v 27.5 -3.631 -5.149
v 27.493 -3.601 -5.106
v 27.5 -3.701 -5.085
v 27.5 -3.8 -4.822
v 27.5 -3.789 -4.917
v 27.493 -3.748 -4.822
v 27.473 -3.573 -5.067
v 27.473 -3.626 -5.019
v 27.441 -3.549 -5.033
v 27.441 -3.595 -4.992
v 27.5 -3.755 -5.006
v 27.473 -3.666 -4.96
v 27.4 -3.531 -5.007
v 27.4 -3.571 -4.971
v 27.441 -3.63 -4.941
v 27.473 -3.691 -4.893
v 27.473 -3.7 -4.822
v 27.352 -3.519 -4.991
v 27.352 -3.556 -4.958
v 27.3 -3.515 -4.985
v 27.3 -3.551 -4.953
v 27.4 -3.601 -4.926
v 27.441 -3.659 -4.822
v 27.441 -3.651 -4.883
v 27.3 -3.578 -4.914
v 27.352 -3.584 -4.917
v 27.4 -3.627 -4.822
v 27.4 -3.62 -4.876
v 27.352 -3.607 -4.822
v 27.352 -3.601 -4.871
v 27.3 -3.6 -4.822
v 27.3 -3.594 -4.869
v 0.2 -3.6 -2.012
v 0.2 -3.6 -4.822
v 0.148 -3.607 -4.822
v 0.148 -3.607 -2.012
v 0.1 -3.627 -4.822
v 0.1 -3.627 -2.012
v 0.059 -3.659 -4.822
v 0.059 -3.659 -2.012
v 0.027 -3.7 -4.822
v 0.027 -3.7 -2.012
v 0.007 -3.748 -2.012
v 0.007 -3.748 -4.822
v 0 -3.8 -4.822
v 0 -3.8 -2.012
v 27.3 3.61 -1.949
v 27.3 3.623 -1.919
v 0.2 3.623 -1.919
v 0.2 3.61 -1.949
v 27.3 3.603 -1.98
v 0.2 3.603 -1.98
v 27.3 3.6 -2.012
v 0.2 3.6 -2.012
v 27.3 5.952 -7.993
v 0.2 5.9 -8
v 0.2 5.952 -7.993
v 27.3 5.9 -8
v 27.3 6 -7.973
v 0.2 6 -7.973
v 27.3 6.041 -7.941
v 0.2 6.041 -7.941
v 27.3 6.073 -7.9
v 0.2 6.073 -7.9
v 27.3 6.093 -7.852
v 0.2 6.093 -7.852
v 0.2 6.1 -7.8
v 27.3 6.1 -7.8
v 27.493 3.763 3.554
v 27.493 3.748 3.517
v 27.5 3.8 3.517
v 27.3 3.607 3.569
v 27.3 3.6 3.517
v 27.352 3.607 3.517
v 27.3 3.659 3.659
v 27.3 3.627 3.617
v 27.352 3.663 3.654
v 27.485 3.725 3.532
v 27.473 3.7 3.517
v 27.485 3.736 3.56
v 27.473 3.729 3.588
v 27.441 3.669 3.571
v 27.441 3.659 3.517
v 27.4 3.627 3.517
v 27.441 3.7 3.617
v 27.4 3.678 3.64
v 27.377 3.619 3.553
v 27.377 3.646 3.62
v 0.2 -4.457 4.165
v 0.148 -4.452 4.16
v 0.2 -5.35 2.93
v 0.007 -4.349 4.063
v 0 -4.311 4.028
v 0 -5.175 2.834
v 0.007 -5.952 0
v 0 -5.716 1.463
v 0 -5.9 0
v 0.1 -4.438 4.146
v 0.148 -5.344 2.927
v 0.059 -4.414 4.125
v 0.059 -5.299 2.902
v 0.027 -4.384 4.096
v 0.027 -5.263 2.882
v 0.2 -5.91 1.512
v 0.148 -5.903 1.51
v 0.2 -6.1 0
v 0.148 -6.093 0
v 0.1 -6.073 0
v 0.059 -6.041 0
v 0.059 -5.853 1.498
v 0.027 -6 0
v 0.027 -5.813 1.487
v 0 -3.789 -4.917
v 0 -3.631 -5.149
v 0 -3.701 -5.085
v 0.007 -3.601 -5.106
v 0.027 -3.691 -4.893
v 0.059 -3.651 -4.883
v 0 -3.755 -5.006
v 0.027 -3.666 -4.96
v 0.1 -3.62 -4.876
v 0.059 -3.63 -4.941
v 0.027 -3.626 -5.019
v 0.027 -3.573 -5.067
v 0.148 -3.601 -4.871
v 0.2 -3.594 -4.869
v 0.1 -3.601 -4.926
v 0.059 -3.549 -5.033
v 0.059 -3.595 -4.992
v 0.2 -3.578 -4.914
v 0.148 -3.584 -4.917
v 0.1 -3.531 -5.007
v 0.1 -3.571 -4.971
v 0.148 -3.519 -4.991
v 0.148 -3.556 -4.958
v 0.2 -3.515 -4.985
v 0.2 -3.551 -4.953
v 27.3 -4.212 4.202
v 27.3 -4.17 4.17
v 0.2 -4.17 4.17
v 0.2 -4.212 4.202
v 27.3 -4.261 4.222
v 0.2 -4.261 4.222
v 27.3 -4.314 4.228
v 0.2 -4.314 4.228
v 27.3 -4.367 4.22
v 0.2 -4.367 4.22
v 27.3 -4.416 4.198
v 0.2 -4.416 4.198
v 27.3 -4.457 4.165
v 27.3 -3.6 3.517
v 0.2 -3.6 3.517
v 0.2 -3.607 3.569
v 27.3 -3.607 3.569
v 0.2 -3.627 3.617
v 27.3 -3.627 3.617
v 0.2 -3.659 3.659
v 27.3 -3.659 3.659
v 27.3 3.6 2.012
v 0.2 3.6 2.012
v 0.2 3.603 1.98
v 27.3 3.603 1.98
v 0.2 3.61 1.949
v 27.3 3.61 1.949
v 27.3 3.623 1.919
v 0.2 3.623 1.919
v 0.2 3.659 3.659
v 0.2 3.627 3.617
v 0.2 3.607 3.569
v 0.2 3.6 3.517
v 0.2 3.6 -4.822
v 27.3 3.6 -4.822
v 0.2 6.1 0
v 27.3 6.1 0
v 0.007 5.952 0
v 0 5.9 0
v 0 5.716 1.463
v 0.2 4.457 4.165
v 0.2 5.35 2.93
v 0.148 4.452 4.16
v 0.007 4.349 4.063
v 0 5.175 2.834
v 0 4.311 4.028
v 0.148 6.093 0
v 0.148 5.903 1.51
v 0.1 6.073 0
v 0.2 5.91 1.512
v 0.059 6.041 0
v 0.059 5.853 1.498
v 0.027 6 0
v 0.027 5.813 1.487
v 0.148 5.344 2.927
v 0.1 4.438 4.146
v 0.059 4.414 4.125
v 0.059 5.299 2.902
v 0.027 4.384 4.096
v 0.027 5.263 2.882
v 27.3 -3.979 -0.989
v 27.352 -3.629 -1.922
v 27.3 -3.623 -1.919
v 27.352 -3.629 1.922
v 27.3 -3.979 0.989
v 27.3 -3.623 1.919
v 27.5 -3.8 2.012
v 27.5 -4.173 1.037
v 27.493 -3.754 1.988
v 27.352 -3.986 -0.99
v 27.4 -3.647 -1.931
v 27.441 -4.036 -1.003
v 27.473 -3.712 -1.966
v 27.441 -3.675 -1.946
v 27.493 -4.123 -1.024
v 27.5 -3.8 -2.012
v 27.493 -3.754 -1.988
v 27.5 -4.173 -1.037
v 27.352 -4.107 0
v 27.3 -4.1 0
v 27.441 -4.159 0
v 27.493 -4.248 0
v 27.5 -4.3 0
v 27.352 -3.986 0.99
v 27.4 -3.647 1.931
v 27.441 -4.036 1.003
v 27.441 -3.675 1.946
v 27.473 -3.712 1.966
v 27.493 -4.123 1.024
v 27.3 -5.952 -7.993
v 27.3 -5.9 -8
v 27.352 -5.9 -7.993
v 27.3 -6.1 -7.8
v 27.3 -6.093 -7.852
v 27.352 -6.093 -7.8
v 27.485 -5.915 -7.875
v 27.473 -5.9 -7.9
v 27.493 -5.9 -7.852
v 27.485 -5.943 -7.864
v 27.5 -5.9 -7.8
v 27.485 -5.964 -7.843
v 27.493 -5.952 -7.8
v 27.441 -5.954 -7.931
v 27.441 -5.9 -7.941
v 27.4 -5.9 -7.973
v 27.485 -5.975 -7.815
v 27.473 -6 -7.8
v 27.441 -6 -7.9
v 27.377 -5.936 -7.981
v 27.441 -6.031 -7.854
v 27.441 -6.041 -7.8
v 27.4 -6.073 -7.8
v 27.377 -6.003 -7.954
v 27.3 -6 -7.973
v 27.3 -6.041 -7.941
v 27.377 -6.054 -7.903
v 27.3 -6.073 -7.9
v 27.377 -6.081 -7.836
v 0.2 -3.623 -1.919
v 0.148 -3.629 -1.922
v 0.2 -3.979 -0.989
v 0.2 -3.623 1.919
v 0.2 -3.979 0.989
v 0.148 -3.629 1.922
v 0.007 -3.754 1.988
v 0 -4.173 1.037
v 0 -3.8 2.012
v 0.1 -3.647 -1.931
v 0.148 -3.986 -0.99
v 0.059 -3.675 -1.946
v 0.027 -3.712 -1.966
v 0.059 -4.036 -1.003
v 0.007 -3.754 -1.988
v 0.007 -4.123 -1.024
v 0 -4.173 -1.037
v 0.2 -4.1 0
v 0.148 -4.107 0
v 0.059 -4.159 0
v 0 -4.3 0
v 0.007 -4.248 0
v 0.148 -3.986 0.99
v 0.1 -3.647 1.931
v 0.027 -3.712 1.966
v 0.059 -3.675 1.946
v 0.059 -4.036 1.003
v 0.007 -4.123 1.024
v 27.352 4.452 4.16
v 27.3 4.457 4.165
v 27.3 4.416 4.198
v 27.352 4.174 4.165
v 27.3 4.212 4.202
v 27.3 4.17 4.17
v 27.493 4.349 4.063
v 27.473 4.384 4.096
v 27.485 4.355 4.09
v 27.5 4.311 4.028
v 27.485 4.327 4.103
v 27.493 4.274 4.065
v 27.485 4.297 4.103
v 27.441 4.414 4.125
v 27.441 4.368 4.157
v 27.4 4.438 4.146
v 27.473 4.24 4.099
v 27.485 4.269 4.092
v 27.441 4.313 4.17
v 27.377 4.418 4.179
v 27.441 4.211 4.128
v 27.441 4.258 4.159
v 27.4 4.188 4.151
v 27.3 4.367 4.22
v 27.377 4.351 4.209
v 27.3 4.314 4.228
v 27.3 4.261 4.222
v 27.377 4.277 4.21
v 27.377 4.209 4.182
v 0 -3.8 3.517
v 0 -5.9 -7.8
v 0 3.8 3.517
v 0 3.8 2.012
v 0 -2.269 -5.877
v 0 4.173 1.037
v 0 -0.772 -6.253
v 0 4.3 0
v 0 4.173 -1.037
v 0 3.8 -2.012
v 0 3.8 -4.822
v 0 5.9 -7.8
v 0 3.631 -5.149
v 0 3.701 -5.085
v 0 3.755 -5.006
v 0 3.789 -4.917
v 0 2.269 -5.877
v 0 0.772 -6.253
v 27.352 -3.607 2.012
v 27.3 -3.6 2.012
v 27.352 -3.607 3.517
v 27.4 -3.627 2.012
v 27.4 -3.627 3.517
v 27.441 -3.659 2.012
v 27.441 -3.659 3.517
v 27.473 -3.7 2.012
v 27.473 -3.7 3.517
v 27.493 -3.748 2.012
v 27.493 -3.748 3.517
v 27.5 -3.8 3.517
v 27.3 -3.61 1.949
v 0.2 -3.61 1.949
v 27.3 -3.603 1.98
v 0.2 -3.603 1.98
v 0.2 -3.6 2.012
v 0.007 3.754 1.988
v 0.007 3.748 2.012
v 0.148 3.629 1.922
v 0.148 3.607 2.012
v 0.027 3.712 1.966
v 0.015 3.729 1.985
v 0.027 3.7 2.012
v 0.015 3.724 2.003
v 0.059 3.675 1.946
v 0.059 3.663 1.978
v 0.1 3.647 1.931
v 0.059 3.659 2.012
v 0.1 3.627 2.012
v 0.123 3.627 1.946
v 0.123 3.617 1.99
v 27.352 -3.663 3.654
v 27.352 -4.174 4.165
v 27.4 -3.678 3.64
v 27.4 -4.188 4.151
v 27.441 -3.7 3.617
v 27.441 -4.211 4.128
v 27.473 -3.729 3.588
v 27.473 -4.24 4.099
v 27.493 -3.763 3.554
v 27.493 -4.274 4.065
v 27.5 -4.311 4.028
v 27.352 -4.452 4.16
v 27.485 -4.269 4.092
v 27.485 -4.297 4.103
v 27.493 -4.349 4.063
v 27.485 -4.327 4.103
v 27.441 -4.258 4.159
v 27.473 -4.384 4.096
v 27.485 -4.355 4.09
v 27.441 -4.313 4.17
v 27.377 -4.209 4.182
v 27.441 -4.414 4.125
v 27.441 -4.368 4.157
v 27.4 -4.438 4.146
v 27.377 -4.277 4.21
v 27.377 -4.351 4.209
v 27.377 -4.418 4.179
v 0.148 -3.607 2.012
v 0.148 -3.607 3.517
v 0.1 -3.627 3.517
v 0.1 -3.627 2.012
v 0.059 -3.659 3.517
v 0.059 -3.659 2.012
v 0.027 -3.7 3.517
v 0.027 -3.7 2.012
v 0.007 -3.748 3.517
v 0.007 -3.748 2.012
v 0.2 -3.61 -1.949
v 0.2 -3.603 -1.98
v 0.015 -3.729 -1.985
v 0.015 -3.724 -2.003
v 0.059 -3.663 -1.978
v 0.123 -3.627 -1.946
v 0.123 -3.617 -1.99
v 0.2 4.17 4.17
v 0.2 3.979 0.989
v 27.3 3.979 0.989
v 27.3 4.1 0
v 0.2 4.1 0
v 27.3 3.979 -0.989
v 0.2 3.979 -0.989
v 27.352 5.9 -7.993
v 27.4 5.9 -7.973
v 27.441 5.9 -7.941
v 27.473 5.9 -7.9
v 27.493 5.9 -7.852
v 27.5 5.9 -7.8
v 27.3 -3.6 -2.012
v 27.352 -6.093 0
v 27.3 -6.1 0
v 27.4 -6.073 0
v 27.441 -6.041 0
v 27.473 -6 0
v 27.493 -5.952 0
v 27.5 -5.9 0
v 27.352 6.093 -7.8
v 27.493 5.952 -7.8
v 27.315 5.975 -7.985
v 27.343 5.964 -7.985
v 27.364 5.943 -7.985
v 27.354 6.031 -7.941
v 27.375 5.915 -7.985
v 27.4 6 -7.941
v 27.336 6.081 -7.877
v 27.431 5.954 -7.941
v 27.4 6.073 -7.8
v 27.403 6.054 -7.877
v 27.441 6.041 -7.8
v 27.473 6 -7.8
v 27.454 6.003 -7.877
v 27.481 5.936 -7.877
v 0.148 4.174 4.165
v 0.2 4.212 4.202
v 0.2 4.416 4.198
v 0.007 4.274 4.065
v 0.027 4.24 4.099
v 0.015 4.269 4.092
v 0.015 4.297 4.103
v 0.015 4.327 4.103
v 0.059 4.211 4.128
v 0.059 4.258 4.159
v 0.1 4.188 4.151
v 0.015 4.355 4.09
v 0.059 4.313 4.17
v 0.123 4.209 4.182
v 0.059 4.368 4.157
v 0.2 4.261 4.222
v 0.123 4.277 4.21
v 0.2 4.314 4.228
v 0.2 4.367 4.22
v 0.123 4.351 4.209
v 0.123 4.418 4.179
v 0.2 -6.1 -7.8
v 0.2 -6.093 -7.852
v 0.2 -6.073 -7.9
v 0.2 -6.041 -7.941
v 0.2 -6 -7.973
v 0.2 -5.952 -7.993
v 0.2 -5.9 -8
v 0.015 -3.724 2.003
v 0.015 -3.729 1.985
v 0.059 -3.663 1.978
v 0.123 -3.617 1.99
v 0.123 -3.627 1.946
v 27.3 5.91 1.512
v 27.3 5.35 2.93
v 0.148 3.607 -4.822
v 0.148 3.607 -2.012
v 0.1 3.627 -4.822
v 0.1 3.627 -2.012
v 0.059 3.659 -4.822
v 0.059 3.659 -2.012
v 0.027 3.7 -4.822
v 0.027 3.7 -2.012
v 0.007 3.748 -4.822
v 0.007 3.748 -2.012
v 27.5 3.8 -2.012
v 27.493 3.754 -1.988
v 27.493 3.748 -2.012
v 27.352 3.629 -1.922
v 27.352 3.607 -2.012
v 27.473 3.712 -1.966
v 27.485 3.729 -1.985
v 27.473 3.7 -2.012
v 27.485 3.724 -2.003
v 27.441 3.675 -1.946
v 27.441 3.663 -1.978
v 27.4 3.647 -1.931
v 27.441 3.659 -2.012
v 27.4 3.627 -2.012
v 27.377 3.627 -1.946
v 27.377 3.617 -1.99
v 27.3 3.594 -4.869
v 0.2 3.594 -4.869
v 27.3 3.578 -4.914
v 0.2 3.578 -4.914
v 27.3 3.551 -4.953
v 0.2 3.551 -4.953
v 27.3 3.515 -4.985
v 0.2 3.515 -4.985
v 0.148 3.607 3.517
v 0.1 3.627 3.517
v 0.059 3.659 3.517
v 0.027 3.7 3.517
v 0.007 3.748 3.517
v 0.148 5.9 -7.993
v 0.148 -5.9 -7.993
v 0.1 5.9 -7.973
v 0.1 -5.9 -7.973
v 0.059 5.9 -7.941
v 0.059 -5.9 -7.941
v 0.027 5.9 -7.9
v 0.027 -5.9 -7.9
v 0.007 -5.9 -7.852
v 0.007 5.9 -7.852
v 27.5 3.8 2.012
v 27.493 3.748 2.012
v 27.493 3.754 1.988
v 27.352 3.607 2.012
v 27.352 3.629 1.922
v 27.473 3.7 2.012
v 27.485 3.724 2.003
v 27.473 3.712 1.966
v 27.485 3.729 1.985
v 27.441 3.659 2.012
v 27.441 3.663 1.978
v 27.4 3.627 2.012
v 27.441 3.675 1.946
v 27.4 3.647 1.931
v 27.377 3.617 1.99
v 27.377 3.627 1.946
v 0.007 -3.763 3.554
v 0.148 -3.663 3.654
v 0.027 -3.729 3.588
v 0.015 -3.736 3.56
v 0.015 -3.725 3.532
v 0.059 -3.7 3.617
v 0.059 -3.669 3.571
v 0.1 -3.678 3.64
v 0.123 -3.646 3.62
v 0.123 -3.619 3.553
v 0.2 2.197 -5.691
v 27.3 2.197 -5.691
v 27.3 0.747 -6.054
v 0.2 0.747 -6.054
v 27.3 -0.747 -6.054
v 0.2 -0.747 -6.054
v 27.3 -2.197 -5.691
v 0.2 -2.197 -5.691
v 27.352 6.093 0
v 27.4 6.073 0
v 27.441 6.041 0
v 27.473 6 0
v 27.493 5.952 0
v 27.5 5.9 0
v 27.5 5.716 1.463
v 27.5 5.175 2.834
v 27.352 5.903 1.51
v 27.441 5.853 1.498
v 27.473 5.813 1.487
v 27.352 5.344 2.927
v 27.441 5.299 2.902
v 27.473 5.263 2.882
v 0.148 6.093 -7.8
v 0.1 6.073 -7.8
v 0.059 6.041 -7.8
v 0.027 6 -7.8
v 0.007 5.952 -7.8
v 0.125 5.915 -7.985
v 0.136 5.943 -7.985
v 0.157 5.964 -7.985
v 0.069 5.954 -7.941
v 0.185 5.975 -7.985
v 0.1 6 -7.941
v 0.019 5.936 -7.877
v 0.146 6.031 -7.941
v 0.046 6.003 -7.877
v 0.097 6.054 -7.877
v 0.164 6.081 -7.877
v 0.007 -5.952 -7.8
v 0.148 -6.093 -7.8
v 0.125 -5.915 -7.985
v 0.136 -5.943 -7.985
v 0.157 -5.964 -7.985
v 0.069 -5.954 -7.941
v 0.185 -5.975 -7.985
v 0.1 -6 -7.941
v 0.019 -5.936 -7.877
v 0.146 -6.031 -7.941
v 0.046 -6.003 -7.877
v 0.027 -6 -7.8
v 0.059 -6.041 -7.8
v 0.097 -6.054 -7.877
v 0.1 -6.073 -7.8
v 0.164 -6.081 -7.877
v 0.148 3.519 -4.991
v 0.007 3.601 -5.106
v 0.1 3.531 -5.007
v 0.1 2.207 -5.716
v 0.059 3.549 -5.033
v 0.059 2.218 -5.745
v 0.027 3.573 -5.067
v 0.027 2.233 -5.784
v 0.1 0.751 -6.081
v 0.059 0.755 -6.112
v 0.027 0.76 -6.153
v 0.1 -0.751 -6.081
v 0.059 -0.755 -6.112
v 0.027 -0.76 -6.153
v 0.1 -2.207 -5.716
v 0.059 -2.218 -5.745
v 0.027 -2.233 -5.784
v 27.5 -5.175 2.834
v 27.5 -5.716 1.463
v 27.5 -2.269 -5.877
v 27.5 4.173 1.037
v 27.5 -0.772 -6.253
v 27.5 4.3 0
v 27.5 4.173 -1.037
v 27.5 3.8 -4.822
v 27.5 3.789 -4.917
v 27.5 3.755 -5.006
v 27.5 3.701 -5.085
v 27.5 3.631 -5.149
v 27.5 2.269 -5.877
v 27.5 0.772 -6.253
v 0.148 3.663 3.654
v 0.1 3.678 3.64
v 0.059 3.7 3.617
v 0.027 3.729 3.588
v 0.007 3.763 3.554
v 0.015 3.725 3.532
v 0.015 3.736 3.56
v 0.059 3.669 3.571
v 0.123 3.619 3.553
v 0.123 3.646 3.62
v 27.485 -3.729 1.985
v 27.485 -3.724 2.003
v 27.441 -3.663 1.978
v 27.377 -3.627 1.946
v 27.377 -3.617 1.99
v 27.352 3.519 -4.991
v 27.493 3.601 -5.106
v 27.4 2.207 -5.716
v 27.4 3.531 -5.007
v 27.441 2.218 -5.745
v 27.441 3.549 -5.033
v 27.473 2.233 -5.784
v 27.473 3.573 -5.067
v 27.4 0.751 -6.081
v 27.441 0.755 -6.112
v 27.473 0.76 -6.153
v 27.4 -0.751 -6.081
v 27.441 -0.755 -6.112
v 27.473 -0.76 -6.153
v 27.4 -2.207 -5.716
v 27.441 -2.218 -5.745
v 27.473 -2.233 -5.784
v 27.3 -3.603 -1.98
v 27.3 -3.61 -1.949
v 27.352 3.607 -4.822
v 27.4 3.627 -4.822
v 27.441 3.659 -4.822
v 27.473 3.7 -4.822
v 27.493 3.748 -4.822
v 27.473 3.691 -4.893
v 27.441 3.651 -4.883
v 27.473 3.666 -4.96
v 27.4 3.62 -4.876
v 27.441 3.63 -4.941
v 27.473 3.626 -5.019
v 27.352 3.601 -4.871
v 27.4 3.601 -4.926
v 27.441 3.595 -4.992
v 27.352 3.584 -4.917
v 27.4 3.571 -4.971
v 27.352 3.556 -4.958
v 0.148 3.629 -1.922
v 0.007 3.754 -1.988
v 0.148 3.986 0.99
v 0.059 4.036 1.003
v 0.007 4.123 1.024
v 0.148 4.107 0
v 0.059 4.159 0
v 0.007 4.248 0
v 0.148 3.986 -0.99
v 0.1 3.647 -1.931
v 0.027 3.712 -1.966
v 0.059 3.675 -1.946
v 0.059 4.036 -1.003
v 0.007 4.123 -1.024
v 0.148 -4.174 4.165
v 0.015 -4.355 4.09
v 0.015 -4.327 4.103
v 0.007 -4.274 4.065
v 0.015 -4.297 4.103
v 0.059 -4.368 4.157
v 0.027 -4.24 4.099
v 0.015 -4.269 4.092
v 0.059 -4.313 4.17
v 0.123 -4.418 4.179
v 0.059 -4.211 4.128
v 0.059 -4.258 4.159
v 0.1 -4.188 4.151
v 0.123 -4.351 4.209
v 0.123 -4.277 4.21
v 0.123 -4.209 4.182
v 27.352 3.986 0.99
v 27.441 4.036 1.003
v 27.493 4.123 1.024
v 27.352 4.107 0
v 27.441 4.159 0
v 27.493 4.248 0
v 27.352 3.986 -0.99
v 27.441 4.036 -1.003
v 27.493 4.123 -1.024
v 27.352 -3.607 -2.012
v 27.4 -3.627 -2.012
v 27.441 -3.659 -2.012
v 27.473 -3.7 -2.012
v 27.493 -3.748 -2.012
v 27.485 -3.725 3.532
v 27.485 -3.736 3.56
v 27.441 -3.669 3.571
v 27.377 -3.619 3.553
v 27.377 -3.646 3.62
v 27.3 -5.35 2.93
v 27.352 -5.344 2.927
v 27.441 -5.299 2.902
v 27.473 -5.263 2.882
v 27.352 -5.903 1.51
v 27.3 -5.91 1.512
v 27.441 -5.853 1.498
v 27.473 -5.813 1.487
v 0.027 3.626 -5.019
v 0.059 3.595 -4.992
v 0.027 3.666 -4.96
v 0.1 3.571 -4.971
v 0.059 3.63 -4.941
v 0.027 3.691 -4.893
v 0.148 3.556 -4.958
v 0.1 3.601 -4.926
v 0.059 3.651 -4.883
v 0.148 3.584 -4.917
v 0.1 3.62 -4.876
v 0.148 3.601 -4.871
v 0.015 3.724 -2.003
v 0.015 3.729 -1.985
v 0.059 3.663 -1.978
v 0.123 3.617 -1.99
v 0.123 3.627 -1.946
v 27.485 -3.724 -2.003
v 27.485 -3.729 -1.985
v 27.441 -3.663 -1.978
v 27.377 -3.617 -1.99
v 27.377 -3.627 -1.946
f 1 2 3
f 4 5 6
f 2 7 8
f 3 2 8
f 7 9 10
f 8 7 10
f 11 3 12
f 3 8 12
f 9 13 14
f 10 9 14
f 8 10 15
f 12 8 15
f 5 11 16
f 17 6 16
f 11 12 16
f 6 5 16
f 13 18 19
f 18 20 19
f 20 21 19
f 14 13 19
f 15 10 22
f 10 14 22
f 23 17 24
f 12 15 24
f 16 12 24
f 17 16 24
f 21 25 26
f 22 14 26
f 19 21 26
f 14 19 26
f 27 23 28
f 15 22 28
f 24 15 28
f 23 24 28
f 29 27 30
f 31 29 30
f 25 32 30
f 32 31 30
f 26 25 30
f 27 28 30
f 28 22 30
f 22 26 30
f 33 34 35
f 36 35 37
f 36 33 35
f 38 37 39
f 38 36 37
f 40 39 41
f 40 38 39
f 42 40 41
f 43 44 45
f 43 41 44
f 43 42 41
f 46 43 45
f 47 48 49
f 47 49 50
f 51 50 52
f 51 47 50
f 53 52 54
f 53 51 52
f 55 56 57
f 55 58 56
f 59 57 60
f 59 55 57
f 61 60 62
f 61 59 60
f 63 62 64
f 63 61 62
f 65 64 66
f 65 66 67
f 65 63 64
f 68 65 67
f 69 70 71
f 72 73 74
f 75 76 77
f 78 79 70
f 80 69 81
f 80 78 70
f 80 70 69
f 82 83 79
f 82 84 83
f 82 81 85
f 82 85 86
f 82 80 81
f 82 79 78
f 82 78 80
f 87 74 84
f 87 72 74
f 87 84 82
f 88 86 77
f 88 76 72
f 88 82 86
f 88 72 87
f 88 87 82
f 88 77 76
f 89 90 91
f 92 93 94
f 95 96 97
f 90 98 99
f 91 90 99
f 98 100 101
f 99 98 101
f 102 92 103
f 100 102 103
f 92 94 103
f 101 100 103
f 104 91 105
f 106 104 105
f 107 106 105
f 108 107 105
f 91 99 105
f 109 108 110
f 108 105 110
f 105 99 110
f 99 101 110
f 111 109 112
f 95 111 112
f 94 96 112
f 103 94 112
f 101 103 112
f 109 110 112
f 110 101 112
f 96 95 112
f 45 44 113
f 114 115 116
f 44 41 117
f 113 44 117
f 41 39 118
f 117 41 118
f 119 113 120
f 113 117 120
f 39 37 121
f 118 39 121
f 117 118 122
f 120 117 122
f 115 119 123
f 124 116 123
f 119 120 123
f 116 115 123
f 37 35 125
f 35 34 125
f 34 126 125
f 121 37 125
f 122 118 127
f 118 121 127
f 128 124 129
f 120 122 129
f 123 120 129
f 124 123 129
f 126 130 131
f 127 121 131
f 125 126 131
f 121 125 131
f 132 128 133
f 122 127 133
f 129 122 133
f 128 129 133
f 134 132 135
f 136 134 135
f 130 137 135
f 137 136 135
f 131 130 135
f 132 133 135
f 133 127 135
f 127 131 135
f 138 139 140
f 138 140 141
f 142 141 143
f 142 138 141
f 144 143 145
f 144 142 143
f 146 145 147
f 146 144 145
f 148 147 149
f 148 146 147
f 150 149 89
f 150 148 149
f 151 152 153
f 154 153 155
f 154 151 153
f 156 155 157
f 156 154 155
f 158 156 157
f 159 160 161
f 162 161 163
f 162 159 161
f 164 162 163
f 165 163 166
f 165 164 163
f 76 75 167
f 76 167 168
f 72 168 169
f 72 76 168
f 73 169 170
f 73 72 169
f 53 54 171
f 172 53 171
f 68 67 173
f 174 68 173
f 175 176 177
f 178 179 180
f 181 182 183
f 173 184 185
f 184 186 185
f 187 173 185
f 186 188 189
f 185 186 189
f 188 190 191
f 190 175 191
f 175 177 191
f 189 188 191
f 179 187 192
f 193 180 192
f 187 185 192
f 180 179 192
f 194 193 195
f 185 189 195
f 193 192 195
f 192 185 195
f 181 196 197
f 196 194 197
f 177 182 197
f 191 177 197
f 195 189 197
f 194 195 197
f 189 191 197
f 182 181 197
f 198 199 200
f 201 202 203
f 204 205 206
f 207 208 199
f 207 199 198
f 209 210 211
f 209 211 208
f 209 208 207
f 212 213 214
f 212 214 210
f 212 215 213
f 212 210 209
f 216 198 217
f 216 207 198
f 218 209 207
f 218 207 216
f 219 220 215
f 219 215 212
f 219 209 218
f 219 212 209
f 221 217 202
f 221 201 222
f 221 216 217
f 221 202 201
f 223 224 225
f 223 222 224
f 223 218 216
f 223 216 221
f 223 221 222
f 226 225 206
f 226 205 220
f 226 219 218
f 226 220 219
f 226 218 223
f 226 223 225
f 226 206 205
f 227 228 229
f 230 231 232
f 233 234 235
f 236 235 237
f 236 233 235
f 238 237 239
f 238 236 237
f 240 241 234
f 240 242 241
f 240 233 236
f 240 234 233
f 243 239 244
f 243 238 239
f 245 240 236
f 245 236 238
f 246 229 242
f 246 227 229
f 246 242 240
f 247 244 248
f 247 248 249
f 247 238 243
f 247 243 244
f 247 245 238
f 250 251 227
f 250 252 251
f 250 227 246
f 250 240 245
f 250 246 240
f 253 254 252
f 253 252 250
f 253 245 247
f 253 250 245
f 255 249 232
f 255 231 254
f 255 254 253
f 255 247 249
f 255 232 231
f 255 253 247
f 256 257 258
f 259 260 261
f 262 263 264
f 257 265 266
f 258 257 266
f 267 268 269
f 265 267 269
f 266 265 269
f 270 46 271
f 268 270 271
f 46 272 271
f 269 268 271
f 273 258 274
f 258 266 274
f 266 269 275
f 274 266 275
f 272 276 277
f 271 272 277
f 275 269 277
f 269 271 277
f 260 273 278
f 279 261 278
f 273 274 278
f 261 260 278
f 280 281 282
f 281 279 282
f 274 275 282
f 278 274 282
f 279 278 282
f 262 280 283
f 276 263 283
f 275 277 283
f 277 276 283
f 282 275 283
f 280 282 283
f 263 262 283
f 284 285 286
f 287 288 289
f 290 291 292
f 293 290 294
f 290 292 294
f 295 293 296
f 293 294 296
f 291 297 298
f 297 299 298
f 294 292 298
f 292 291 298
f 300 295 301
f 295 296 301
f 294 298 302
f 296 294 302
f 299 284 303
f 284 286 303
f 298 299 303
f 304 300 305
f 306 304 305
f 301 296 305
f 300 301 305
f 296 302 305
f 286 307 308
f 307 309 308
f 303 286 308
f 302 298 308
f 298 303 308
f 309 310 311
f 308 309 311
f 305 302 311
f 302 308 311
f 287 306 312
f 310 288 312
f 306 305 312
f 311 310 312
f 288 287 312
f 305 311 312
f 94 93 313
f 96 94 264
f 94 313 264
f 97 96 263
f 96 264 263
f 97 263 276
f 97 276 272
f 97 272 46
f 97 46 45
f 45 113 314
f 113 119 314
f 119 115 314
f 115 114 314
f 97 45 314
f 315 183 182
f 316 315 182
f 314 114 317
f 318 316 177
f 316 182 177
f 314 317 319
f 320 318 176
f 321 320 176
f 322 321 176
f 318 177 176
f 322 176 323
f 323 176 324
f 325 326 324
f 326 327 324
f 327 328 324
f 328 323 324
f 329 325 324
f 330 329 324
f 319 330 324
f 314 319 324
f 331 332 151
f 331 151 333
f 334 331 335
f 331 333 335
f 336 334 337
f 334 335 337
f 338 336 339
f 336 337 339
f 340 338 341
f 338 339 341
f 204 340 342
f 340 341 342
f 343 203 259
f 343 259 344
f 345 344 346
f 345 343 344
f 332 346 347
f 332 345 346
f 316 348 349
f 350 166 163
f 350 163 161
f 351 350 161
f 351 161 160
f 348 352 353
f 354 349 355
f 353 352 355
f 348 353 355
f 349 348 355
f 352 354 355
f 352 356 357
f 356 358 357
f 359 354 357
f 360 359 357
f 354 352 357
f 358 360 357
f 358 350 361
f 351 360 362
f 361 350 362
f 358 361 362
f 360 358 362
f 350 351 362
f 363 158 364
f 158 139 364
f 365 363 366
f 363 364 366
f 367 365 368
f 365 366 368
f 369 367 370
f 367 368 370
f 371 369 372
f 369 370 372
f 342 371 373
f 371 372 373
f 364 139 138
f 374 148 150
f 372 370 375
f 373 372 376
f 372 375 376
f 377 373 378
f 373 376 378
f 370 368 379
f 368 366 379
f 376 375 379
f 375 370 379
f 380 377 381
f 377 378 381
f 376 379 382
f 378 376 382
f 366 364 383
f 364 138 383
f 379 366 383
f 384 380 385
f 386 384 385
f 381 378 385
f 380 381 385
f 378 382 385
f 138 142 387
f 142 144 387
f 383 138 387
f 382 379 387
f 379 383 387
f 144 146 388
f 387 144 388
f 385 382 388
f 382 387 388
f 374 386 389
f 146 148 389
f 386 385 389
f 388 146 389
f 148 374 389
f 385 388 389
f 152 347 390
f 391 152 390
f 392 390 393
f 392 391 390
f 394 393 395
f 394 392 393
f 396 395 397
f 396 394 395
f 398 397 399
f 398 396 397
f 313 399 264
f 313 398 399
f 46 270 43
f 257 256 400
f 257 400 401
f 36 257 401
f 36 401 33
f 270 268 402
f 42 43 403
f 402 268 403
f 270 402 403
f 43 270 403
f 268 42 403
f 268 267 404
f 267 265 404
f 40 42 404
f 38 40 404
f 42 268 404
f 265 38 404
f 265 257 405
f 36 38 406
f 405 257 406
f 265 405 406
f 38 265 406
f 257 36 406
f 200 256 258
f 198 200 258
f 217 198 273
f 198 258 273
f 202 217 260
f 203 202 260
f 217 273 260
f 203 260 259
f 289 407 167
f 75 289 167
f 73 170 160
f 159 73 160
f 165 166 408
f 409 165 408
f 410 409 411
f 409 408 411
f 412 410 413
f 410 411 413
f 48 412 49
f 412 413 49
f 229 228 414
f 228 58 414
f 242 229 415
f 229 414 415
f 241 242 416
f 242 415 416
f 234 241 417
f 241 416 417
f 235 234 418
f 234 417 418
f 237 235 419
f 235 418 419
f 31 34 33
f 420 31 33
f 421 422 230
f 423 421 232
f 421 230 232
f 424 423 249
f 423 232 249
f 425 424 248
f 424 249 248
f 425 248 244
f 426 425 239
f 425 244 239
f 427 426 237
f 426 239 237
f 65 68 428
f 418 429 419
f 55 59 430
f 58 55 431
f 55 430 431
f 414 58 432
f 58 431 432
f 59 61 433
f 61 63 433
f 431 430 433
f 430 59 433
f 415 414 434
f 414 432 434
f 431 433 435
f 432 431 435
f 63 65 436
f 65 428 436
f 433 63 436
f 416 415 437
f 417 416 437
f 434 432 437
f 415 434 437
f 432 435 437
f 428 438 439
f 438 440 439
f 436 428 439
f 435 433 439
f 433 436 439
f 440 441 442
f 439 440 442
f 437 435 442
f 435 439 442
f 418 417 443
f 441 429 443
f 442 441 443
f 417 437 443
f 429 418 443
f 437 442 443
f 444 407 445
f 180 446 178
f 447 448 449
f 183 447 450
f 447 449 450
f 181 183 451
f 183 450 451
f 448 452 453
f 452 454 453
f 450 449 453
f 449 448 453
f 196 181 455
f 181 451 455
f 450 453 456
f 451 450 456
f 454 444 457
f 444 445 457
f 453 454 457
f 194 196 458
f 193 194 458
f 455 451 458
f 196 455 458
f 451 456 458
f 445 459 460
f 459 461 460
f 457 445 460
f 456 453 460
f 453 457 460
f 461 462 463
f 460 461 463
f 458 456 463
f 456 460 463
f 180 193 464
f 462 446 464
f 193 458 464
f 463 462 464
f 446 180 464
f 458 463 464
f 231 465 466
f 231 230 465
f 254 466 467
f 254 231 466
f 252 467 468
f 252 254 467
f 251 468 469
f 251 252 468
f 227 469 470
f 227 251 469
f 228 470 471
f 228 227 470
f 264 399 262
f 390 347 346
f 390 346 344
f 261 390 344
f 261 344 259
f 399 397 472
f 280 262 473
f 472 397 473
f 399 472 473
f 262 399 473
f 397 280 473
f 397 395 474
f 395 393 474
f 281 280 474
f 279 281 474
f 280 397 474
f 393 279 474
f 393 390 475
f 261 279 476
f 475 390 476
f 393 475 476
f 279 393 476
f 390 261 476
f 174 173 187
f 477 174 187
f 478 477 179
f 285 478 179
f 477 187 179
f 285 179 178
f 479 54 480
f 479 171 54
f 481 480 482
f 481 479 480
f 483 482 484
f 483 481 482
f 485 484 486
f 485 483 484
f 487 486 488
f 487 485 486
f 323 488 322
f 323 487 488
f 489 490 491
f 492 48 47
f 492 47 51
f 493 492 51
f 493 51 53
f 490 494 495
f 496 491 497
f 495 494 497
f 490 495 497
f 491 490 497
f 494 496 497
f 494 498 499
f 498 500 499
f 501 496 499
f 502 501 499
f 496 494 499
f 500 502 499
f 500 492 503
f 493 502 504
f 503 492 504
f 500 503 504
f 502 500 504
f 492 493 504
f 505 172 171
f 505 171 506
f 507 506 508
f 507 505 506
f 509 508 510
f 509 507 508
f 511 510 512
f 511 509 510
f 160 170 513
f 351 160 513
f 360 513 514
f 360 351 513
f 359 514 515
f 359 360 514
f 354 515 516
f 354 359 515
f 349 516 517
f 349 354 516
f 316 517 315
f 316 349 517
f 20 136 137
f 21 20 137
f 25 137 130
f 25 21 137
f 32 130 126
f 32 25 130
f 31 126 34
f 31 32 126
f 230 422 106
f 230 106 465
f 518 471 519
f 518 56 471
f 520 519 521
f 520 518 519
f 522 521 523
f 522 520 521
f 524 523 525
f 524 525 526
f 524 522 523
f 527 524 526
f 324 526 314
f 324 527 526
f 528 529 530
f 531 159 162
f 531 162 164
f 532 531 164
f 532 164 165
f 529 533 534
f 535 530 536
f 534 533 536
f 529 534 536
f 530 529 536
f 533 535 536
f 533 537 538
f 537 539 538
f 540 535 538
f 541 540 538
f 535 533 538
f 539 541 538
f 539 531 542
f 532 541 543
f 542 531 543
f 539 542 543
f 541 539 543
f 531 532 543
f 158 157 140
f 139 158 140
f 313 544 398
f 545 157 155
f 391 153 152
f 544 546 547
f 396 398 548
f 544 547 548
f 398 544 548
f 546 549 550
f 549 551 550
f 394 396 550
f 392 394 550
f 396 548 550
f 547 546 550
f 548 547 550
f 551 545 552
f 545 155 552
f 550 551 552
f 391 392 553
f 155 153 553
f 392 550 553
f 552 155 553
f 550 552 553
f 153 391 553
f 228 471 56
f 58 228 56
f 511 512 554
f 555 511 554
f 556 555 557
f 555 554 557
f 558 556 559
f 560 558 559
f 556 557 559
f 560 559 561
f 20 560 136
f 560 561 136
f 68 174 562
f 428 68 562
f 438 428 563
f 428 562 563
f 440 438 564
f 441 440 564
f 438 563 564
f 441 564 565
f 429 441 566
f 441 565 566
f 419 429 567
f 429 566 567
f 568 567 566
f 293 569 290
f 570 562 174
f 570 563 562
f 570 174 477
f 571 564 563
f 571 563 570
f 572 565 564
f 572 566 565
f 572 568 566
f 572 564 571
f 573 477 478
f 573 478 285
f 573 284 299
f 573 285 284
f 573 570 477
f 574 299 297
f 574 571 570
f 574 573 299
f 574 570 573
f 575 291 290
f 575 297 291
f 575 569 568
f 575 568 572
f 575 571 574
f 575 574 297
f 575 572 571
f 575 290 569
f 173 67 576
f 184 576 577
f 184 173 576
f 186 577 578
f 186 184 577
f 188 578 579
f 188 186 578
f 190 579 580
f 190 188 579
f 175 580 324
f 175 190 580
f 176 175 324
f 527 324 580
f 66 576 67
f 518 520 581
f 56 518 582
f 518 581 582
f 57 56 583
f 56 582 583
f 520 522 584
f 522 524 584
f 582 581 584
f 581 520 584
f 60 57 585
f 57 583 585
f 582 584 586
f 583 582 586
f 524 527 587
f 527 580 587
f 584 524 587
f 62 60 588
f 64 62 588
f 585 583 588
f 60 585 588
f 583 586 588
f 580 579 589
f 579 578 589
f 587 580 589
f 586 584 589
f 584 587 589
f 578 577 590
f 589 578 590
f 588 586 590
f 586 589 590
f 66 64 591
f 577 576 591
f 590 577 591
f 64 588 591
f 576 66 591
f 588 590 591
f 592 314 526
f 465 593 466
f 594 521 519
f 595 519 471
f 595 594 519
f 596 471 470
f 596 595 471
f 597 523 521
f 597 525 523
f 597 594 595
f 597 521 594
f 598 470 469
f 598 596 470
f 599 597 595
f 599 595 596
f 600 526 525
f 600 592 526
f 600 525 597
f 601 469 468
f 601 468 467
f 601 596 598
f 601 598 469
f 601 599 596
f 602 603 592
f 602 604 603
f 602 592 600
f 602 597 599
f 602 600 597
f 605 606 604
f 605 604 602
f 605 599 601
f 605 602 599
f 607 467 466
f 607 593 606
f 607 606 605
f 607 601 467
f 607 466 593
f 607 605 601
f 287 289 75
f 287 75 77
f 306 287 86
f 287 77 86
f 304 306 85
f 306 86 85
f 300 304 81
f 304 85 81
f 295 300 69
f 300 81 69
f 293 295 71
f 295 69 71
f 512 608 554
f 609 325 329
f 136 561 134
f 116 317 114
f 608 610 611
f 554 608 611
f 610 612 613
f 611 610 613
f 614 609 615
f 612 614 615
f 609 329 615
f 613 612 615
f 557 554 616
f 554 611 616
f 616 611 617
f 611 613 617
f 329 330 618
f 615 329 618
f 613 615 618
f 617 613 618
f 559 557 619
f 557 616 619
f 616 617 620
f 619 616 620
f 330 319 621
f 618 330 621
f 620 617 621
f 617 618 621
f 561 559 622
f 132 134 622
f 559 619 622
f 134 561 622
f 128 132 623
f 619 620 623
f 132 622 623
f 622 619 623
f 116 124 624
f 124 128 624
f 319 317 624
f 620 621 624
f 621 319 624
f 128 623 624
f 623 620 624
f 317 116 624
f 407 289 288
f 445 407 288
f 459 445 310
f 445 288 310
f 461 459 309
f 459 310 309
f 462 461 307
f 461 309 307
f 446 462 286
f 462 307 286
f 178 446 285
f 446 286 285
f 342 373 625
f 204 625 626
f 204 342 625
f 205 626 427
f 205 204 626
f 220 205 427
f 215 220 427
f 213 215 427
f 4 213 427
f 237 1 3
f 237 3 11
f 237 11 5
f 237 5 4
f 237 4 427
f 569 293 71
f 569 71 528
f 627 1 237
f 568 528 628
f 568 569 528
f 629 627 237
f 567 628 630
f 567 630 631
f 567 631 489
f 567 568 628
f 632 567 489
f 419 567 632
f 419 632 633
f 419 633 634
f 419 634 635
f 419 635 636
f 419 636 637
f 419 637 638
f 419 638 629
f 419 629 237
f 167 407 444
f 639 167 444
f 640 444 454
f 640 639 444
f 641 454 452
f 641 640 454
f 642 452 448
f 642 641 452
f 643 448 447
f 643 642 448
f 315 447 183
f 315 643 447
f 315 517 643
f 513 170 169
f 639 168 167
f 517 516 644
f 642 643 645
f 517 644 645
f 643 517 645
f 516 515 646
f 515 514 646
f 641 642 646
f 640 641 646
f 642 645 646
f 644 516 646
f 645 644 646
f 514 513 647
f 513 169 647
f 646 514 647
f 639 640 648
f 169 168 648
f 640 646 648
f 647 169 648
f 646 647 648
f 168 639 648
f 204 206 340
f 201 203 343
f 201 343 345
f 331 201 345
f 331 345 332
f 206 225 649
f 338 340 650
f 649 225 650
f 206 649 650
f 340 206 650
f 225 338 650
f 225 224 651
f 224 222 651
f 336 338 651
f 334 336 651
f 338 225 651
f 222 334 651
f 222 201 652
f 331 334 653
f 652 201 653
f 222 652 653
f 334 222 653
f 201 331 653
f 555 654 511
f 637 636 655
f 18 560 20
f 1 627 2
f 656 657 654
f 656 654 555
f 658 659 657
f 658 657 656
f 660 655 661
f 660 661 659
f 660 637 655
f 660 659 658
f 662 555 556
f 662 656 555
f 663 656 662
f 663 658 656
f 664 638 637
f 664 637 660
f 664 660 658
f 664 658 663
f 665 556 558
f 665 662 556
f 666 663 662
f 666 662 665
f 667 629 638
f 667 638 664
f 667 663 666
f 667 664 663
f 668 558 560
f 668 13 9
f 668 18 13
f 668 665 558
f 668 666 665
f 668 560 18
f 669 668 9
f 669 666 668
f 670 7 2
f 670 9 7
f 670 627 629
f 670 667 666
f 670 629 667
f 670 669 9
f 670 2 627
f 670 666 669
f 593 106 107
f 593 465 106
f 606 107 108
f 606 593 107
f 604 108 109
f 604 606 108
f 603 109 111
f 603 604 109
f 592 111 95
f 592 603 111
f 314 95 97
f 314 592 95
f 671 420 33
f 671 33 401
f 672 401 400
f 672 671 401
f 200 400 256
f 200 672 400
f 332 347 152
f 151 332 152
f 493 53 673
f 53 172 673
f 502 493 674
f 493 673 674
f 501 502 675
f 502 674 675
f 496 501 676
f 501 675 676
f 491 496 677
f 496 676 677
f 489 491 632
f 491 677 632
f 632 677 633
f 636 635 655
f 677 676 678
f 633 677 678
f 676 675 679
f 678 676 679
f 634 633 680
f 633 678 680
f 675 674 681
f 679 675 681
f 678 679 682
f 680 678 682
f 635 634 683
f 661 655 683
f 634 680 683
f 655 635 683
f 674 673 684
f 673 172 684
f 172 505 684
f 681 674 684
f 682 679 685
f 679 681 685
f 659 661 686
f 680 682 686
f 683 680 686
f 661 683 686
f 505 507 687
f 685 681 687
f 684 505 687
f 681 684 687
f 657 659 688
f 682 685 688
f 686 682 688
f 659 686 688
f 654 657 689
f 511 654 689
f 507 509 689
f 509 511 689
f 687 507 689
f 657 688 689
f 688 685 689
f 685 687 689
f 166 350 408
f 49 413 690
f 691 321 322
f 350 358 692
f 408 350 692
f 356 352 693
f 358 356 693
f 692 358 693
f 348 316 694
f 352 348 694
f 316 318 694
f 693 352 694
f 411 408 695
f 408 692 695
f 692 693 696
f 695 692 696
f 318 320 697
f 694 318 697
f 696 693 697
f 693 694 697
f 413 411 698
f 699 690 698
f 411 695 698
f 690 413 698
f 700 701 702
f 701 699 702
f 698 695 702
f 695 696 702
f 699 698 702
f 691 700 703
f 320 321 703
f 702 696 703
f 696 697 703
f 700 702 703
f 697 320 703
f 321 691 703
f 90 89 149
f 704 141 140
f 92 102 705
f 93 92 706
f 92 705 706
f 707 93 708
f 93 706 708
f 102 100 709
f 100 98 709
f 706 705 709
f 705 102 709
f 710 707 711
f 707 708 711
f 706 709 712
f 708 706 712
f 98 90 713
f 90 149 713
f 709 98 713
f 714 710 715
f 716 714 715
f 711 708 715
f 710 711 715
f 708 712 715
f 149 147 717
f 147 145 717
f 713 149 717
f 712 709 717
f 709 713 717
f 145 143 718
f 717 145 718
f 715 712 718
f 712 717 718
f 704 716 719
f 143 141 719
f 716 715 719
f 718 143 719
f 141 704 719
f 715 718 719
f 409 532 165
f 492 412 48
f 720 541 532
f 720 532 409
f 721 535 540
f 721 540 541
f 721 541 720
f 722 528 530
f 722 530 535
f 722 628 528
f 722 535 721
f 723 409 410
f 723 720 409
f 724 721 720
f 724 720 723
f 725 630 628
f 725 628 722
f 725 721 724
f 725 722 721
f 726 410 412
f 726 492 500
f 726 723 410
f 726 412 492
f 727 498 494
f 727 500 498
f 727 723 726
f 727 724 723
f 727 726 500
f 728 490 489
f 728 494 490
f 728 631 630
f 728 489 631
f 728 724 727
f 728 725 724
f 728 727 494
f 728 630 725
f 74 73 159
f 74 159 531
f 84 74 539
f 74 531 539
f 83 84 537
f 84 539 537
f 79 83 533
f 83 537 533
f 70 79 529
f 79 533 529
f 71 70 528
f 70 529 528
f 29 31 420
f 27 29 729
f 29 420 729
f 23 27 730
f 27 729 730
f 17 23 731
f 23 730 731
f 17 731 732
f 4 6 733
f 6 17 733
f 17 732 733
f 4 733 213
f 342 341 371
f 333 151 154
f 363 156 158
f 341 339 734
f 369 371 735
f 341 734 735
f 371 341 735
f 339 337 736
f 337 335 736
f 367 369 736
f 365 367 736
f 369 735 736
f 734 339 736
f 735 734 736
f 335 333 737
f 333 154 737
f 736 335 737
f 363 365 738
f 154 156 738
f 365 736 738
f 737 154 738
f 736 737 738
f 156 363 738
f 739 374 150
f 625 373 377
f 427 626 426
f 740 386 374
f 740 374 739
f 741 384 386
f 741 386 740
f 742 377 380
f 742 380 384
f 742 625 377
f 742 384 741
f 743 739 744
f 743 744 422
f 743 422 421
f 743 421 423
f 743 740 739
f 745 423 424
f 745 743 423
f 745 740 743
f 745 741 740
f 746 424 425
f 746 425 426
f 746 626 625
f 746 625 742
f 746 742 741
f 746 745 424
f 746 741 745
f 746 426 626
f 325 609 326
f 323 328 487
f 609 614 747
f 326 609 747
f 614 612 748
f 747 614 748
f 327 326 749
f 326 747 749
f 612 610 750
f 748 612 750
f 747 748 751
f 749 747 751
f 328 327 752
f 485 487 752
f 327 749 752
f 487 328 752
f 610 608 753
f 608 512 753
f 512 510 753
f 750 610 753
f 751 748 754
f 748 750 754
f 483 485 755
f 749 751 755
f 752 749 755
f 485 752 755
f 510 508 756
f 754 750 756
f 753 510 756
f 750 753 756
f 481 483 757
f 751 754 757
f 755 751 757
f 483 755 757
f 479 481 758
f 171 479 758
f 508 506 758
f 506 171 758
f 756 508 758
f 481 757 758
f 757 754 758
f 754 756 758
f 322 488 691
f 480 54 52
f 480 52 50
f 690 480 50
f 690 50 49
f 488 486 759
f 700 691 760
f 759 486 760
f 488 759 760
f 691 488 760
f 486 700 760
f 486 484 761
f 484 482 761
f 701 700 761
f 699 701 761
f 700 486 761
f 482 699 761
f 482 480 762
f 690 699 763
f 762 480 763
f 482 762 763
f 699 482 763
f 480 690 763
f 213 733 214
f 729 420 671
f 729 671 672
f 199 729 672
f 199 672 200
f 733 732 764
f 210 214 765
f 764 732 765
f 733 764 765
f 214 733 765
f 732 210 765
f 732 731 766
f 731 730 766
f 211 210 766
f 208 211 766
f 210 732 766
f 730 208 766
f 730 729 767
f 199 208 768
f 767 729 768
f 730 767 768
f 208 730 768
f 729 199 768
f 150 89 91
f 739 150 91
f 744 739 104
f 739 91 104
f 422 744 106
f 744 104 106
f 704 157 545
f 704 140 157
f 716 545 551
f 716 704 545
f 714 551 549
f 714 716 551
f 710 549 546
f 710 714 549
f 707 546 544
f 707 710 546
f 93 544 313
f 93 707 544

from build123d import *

# Parameters (mm, degrees)
BOSS_EXTRUDE1_DEPTH = 27.5
FILLET1_R           = 0.2


with BuildPart() as part:
    # Sketch1 → Boss-Extrude1 (new body)
    with BuildSketch(Plane(origin=(0, 0, 0), x_dir=(0, 0, -1), z_dir=(1, 0, 0))):
        with BuildLine():
            Line((-4.3133513652379465, 4.313351365237932), (-3.6000000000000107, 3.5999999999999988))
            Line((-3.6000000000000103, 3.5999999999999996), (-1.9621416870348378, 3.5999999999999996))
            ThreePointArc((-1.962141687034841, 3.6000000000000094), (-1.978e-14, 4.1), (1.962141687034806, 3.600000000000028))
            Line((1.9621416870347996, 3.5999999999999996), (4.924428900898164, 3.5999999999999996))
            ThreePointArc((4.9244289008981275, 3.5999999999998975), (4.632641104588721, 3.96845516493194), (4.3133513652379465, 4.313351365237932))
            ThreePointArc((4.3133513652379465, 4.313351365237932), (2.3343689374270524, 5.6356651483188465), (3.7e-16, 6.1))
            ThreePointArc((3.7e-16, 6.1), (-2.334368937427052, 5.6356651483188465), (-4.3133513652379465, 4.313351365237932))
        make_face()
        with BuildLine():
            Line((8, 6.1), (0, 6.1))
            ThreePointArc((3.7e-16, 6.1), (2.3343689374270524, 5.6356651483188465), (4.3133513652379465, 4.313351365237932))
            Line((4.3133513652379465, 4.313351365237932), (8, 4.313351365237933))
            Line((8, 4.313351365237933), (8, 6.1))
        make_face()
        with BuildLine():
            ThreePointArc((4.3133513652379465, 4.313351365237932), (4.632641104588721, 3.96845516493194), (4.9244289008981275, 3.5999999999998975))
            Line((4.924428900898164, 3.5999999999999996), (8, 3.5999999999999996))
            Line((8, 3.5999999999999996), (8, 4.313351365237933))
            Line((8, 4.313351365237933), (4.3133513652379465, 4.313351365237932))
        make_face()
        with BuildLine():
            Line((8, 3.5999999999999996), (4.924428900898164, 3.5999999999999996))
            ThreePointArc((4.9244289008981275, 3.5999999999998975), (5.7986643417031205, 1.8935395037497136), (6.1, 0))
            ThreePointArc((6.1, -1.49e-15), (5.7986643417031205, -1.8935395037497147), (4.924428900898127, -3.599999999999898))
            Line((4.924428900898162, -3.6), (8, -3.5999999999999996))
            Line((8, -3.5999999999999996), (8, 3.5999999999999996))
        make_face()
        with BuildLine():
            ThreePointArc((4.3133513652379465, -4.313351365237933), (2.334368937427049, -5.635665148318848), (-6.54e-15, -6.1))
            Line((-6.22e-15, -6.1), (8, -6.1))
            Line((8, -6.1), (8, -4.313351365237933))
            Line((8, -4.313351365237933), (4.3133513652379465, -4.313351365237932))
        make_face()
        with BuildLine():
            Line((8, -3.5999999999999996), (4.924428900898162, -3.6))
            ThreePointArc((4.924428900898127, -3.599999999999898), (4.6326411045887195, -3.968455164931942), (4.3133513652379465, -4.313351365237933))
            Line((4.3133513652379465, -4.313351365237932), (8, -4.313351365237933))
            Line((8, -4.313351365237933), (8, -3.5999999999999996))
        make_face()
        with BuildLine():
            Line((-1.9621416870348352, -3.6000000000000005), (-3.6000000000000156, -3.600000000000001))
            Line((-3.600000000000014, -3.6000000000000023), (-4.3133513652379465, -4.313351365237932))
            ThreePointArc((-4.313351365237948, -4.313351365237931), (-2.334368937427056, -5.635665148318846), (-6.54e-15, -6.1))
            ThreePointArc((-6.54e-15, -6.1), (2.334368937427049, -5.635665148318848), (4.3133513652379465, -4.313351365237933))
            ThreePointArc((4.3133513652379465, -4.313351365237933), (4.6326411045887195, -3.968455164931942), (4.924428900898127, -3.599999999999898))
            Line((4.924428900898162, -3.6), (1.9621416870348023, -3.6000000000000005))
            ThreePointArc((1.9621416870348085, -3.6000000000000267), (-1.532e-14, -4.1), (-1.9621416870348387, -3.6000000000000103))
        make_face()
    extrude(amount=BOSS_EXTRUDE1_DEPTH)

    # Fillet1
    fillet1_edges = [part.edges().sort_by_distance(p)[0] for p in [
        (0, -6.1, -3.9999999999999973),
        (0, -5.635665148318846, 2.334368937427055),
        (0, -3.9566756826189673, 3.95667568261898),
        (27.5, 6.1, -4),
        (0, -3.6000000000000005, 2.7810708435174254),
        (0, -4.1000000000000005, 1.654e-14),
        (0, -3.6, -3.443285293966482),
        (0, -6.1e-16, -6.100000000000001),
        (0, 3.6000000000000103, -3.4432852939664738),
        (0, 4.1, 1.982e-14),
        (0, 3.5999999999999996, 2.781070843517424),
        (0, 3.9566756826189655, 3.956675682618979),
        (0, 5.635665148318875, 2.334368937427066),
        (27.5, 5.6356651483188465, 2.334368937427051),
        (0, 6.1, -4),
        (0, 0, -8),
        (27.5, 3.9566756826189655, 3.956675682618979),
        (13.75, -6.1, -8),
        (13.75, -4.313351365237931, 4.313351365237947),
        (13.75, -3.6000000000000014, 3.6000000000000147),
        (13.75, -3.600000000000006, 1.9621416870348367),
        (13.75, -3.600000000000014, -1.9621416870348056),
        (13.75, -3.599999999999949, -4.924428900898144),
        (13.75, 3.599999999999948, -4.924428900898145),
        (13.75, 3.600000000000014, -1.9621416870348032),
        (13.75, 3.600000000000005, 1.9621416870348396),
        (13.75, 3.599999999999999, 3.6000000000000103),
        (13.75, 4.313351365237933, 4.313351365237946),
        (13.75, 6.1, -8),
        (27.5, 3.5999999999999996, 2.781070843517424),
        (27.5, 4.1, 1.982e-14),
        (27.5, 0, -8),
        (27.5, 3.6000000000000103, -3.4432852939664738),
        (27.5, -6.1e-16, -6.100000000000001),
        (27.5, -3.6, -3.443285293966482),
        (27.5, -4.1000000000000005, 1.654e-14),
        (27.5, -3.6000000000000005, 2.7810708435174254),
        (27.5, -3.9566756826189673, 3.95667568261898),
        (27.5, -5.635665148318815, 2.3343689374270387),
        (27.5, -6.1, -3.9999999999999973),
    ]]
    fillet(fillet1_edges, radius=FILLET1_R)


solid = part.part
